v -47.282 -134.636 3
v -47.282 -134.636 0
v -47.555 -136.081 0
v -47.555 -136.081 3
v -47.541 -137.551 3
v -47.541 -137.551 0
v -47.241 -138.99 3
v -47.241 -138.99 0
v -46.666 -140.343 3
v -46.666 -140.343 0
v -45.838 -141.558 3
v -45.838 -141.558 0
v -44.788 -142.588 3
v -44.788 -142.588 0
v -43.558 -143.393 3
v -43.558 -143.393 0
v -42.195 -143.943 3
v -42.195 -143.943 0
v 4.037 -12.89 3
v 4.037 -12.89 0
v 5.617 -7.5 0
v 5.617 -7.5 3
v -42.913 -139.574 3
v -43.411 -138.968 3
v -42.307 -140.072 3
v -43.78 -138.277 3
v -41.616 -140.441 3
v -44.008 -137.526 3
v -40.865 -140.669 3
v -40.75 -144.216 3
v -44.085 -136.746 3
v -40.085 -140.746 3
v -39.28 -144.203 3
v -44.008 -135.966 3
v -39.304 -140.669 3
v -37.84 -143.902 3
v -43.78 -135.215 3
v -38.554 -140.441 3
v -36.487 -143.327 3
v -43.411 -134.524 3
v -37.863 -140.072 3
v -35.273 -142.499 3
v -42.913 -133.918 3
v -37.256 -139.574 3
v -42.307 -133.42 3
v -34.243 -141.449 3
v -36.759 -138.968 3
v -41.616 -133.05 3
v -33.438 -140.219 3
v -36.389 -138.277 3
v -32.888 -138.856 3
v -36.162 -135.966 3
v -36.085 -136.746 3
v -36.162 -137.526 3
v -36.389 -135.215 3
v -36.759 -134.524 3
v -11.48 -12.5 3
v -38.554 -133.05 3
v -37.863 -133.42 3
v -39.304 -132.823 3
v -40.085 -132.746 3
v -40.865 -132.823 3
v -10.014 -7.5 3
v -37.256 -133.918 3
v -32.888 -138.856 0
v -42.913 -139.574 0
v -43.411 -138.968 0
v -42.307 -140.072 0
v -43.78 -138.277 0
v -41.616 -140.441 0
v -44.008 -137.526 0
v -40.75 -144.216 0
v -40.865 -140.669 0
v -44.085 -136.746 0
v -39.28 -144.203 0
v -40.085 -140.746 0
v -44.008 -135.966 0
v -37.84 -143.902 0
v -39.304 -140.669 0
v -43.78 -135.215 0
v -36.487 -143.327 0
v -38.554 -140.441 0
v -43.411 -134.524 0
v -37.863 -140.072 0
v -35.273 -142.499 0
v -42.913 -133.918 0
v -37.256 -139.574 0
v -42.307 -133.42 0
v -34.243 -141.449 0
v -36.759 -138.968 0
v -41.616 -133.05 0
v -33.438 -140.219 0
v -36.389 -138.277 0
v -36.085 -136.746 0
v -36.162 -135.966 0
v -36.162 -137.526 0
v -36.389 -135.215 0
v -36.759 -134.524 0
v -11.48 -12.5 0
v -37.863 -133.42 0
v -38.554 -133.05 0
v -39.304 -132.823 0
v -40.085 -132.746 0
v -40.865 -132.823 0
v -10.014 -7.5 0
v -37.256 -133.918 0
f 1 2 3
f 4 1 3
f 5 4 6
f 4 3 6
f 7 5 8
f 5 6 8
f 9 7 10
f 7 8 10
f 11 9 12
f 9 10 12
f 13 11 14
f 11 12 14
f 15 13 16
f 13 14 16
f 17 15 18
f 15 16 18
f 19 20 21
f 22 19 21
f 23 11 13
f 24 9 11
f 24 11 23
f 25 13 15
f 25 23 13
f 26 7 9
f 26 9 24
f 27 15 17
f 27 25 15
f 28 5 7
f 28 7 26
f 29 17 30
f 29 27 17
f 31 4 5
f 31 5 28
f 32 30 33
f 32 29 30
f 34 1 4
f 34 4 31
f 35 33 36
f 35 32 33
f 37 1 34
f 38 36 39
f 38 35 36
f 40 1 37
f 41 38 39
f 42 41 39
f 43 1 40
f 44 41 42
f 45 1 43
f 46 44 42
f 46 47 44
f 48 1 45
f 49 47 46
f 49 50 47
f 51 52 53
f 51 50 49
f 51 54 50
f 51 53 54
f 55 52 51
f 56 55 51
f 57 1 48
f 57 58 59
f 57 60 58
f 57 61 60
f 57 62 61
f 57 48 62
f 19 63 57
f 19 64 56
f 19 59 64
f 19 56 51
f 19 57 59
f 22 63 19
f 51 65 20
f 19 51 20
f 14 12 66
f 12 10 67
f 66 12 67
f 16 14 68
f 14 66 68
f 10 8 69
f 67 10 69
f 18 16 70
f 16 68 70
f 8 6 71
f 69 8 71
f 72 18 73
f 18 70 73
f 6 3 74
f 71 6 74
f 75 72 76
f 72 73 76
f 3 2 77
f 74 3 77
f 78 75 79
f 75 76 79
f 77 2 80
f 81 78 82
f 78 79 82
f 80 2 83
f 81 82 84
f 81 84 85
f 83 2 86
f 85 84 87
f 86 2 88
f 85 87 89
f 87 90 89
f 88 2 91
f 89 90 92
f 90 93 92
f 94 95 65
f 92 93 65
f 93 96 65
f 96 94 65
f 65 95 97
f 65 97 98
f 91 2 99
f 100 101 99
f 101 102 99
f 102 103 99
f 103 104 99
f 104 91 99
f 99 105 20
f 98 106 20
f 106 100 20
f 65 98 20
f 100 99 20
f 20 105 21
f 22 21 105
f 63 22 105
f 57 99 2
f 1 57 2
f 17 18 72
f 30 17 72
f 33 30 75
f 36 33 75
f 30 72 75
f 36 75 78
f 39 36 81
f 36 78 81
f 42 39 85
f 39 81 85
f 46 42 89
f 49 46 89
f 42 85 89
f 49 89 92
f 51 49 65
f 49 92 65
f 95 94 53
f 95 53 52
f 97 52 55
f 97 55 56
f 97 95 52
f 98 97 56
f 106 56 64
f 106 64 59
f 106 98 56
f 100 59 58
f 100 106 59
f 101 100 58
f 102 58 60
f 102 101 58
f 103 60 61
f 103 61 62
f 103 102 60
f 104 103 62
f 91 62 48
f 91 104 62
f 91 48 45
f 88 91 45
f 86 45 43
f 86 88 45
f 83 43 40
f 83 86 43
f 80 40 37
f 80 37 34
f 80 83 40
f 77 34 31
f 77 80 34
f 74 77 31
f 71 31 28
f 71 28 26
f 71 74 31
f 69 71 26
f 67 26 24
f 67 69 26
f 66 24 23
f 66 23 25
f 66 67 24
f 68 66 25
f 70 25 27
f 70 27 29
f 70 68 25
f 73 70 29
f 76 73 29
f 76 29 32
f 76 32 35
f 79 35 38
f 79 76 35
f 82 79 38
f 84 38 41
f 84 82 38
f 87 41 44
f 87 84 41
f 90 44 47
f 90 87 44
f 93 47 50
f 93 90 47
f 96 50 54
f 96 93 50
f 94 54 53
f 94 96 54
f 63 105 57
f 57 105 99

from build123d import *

# Parameters (mm, degrees)
F0_R     = 4
F1_DEPTH = 3


# Not quite as in the source:
# - a feature names something its author has since deleted; it is built from what else it names


with BuildPart() as f1:
    # F0 (on Top) → F1 (new body)
    with BuildSketch(Plane.XY):
        with BuildLine():
            Line((-11.4797556719, -12.5), (-47.2819722649, -134.6362324887))
            ThreePointArc((-47.2819722649, -134.6362324887), (-46.6657765426, -140.3433149262), (-42.1945436765, -143.9431154447))
            ThreePointArc((-42.1945436765, -143.9431154447), (-36.487461239, -143.3269197224), (-32.8876607204, -138.8556868563))
            Line((-32.8876607204, -138.8556868563), (4.0370171151, -12.8902728162))
            Line((4.0370171151, -12.8902728162), (5.6170864437, -7.5))
            Line((5.6170864437, -7.5), (-10.0140883648, -7.5))
            Line((-10.0140883648, -7.5), (-11.4797556719, -12.5))
        make_face()
        with Locations((-40.0848164926, -136.7459596725)):
            Circle(F0_R, mode=Mode.SUBTRACT)
    extrude(amount=F1_DEPTH)


solid = f1.part
